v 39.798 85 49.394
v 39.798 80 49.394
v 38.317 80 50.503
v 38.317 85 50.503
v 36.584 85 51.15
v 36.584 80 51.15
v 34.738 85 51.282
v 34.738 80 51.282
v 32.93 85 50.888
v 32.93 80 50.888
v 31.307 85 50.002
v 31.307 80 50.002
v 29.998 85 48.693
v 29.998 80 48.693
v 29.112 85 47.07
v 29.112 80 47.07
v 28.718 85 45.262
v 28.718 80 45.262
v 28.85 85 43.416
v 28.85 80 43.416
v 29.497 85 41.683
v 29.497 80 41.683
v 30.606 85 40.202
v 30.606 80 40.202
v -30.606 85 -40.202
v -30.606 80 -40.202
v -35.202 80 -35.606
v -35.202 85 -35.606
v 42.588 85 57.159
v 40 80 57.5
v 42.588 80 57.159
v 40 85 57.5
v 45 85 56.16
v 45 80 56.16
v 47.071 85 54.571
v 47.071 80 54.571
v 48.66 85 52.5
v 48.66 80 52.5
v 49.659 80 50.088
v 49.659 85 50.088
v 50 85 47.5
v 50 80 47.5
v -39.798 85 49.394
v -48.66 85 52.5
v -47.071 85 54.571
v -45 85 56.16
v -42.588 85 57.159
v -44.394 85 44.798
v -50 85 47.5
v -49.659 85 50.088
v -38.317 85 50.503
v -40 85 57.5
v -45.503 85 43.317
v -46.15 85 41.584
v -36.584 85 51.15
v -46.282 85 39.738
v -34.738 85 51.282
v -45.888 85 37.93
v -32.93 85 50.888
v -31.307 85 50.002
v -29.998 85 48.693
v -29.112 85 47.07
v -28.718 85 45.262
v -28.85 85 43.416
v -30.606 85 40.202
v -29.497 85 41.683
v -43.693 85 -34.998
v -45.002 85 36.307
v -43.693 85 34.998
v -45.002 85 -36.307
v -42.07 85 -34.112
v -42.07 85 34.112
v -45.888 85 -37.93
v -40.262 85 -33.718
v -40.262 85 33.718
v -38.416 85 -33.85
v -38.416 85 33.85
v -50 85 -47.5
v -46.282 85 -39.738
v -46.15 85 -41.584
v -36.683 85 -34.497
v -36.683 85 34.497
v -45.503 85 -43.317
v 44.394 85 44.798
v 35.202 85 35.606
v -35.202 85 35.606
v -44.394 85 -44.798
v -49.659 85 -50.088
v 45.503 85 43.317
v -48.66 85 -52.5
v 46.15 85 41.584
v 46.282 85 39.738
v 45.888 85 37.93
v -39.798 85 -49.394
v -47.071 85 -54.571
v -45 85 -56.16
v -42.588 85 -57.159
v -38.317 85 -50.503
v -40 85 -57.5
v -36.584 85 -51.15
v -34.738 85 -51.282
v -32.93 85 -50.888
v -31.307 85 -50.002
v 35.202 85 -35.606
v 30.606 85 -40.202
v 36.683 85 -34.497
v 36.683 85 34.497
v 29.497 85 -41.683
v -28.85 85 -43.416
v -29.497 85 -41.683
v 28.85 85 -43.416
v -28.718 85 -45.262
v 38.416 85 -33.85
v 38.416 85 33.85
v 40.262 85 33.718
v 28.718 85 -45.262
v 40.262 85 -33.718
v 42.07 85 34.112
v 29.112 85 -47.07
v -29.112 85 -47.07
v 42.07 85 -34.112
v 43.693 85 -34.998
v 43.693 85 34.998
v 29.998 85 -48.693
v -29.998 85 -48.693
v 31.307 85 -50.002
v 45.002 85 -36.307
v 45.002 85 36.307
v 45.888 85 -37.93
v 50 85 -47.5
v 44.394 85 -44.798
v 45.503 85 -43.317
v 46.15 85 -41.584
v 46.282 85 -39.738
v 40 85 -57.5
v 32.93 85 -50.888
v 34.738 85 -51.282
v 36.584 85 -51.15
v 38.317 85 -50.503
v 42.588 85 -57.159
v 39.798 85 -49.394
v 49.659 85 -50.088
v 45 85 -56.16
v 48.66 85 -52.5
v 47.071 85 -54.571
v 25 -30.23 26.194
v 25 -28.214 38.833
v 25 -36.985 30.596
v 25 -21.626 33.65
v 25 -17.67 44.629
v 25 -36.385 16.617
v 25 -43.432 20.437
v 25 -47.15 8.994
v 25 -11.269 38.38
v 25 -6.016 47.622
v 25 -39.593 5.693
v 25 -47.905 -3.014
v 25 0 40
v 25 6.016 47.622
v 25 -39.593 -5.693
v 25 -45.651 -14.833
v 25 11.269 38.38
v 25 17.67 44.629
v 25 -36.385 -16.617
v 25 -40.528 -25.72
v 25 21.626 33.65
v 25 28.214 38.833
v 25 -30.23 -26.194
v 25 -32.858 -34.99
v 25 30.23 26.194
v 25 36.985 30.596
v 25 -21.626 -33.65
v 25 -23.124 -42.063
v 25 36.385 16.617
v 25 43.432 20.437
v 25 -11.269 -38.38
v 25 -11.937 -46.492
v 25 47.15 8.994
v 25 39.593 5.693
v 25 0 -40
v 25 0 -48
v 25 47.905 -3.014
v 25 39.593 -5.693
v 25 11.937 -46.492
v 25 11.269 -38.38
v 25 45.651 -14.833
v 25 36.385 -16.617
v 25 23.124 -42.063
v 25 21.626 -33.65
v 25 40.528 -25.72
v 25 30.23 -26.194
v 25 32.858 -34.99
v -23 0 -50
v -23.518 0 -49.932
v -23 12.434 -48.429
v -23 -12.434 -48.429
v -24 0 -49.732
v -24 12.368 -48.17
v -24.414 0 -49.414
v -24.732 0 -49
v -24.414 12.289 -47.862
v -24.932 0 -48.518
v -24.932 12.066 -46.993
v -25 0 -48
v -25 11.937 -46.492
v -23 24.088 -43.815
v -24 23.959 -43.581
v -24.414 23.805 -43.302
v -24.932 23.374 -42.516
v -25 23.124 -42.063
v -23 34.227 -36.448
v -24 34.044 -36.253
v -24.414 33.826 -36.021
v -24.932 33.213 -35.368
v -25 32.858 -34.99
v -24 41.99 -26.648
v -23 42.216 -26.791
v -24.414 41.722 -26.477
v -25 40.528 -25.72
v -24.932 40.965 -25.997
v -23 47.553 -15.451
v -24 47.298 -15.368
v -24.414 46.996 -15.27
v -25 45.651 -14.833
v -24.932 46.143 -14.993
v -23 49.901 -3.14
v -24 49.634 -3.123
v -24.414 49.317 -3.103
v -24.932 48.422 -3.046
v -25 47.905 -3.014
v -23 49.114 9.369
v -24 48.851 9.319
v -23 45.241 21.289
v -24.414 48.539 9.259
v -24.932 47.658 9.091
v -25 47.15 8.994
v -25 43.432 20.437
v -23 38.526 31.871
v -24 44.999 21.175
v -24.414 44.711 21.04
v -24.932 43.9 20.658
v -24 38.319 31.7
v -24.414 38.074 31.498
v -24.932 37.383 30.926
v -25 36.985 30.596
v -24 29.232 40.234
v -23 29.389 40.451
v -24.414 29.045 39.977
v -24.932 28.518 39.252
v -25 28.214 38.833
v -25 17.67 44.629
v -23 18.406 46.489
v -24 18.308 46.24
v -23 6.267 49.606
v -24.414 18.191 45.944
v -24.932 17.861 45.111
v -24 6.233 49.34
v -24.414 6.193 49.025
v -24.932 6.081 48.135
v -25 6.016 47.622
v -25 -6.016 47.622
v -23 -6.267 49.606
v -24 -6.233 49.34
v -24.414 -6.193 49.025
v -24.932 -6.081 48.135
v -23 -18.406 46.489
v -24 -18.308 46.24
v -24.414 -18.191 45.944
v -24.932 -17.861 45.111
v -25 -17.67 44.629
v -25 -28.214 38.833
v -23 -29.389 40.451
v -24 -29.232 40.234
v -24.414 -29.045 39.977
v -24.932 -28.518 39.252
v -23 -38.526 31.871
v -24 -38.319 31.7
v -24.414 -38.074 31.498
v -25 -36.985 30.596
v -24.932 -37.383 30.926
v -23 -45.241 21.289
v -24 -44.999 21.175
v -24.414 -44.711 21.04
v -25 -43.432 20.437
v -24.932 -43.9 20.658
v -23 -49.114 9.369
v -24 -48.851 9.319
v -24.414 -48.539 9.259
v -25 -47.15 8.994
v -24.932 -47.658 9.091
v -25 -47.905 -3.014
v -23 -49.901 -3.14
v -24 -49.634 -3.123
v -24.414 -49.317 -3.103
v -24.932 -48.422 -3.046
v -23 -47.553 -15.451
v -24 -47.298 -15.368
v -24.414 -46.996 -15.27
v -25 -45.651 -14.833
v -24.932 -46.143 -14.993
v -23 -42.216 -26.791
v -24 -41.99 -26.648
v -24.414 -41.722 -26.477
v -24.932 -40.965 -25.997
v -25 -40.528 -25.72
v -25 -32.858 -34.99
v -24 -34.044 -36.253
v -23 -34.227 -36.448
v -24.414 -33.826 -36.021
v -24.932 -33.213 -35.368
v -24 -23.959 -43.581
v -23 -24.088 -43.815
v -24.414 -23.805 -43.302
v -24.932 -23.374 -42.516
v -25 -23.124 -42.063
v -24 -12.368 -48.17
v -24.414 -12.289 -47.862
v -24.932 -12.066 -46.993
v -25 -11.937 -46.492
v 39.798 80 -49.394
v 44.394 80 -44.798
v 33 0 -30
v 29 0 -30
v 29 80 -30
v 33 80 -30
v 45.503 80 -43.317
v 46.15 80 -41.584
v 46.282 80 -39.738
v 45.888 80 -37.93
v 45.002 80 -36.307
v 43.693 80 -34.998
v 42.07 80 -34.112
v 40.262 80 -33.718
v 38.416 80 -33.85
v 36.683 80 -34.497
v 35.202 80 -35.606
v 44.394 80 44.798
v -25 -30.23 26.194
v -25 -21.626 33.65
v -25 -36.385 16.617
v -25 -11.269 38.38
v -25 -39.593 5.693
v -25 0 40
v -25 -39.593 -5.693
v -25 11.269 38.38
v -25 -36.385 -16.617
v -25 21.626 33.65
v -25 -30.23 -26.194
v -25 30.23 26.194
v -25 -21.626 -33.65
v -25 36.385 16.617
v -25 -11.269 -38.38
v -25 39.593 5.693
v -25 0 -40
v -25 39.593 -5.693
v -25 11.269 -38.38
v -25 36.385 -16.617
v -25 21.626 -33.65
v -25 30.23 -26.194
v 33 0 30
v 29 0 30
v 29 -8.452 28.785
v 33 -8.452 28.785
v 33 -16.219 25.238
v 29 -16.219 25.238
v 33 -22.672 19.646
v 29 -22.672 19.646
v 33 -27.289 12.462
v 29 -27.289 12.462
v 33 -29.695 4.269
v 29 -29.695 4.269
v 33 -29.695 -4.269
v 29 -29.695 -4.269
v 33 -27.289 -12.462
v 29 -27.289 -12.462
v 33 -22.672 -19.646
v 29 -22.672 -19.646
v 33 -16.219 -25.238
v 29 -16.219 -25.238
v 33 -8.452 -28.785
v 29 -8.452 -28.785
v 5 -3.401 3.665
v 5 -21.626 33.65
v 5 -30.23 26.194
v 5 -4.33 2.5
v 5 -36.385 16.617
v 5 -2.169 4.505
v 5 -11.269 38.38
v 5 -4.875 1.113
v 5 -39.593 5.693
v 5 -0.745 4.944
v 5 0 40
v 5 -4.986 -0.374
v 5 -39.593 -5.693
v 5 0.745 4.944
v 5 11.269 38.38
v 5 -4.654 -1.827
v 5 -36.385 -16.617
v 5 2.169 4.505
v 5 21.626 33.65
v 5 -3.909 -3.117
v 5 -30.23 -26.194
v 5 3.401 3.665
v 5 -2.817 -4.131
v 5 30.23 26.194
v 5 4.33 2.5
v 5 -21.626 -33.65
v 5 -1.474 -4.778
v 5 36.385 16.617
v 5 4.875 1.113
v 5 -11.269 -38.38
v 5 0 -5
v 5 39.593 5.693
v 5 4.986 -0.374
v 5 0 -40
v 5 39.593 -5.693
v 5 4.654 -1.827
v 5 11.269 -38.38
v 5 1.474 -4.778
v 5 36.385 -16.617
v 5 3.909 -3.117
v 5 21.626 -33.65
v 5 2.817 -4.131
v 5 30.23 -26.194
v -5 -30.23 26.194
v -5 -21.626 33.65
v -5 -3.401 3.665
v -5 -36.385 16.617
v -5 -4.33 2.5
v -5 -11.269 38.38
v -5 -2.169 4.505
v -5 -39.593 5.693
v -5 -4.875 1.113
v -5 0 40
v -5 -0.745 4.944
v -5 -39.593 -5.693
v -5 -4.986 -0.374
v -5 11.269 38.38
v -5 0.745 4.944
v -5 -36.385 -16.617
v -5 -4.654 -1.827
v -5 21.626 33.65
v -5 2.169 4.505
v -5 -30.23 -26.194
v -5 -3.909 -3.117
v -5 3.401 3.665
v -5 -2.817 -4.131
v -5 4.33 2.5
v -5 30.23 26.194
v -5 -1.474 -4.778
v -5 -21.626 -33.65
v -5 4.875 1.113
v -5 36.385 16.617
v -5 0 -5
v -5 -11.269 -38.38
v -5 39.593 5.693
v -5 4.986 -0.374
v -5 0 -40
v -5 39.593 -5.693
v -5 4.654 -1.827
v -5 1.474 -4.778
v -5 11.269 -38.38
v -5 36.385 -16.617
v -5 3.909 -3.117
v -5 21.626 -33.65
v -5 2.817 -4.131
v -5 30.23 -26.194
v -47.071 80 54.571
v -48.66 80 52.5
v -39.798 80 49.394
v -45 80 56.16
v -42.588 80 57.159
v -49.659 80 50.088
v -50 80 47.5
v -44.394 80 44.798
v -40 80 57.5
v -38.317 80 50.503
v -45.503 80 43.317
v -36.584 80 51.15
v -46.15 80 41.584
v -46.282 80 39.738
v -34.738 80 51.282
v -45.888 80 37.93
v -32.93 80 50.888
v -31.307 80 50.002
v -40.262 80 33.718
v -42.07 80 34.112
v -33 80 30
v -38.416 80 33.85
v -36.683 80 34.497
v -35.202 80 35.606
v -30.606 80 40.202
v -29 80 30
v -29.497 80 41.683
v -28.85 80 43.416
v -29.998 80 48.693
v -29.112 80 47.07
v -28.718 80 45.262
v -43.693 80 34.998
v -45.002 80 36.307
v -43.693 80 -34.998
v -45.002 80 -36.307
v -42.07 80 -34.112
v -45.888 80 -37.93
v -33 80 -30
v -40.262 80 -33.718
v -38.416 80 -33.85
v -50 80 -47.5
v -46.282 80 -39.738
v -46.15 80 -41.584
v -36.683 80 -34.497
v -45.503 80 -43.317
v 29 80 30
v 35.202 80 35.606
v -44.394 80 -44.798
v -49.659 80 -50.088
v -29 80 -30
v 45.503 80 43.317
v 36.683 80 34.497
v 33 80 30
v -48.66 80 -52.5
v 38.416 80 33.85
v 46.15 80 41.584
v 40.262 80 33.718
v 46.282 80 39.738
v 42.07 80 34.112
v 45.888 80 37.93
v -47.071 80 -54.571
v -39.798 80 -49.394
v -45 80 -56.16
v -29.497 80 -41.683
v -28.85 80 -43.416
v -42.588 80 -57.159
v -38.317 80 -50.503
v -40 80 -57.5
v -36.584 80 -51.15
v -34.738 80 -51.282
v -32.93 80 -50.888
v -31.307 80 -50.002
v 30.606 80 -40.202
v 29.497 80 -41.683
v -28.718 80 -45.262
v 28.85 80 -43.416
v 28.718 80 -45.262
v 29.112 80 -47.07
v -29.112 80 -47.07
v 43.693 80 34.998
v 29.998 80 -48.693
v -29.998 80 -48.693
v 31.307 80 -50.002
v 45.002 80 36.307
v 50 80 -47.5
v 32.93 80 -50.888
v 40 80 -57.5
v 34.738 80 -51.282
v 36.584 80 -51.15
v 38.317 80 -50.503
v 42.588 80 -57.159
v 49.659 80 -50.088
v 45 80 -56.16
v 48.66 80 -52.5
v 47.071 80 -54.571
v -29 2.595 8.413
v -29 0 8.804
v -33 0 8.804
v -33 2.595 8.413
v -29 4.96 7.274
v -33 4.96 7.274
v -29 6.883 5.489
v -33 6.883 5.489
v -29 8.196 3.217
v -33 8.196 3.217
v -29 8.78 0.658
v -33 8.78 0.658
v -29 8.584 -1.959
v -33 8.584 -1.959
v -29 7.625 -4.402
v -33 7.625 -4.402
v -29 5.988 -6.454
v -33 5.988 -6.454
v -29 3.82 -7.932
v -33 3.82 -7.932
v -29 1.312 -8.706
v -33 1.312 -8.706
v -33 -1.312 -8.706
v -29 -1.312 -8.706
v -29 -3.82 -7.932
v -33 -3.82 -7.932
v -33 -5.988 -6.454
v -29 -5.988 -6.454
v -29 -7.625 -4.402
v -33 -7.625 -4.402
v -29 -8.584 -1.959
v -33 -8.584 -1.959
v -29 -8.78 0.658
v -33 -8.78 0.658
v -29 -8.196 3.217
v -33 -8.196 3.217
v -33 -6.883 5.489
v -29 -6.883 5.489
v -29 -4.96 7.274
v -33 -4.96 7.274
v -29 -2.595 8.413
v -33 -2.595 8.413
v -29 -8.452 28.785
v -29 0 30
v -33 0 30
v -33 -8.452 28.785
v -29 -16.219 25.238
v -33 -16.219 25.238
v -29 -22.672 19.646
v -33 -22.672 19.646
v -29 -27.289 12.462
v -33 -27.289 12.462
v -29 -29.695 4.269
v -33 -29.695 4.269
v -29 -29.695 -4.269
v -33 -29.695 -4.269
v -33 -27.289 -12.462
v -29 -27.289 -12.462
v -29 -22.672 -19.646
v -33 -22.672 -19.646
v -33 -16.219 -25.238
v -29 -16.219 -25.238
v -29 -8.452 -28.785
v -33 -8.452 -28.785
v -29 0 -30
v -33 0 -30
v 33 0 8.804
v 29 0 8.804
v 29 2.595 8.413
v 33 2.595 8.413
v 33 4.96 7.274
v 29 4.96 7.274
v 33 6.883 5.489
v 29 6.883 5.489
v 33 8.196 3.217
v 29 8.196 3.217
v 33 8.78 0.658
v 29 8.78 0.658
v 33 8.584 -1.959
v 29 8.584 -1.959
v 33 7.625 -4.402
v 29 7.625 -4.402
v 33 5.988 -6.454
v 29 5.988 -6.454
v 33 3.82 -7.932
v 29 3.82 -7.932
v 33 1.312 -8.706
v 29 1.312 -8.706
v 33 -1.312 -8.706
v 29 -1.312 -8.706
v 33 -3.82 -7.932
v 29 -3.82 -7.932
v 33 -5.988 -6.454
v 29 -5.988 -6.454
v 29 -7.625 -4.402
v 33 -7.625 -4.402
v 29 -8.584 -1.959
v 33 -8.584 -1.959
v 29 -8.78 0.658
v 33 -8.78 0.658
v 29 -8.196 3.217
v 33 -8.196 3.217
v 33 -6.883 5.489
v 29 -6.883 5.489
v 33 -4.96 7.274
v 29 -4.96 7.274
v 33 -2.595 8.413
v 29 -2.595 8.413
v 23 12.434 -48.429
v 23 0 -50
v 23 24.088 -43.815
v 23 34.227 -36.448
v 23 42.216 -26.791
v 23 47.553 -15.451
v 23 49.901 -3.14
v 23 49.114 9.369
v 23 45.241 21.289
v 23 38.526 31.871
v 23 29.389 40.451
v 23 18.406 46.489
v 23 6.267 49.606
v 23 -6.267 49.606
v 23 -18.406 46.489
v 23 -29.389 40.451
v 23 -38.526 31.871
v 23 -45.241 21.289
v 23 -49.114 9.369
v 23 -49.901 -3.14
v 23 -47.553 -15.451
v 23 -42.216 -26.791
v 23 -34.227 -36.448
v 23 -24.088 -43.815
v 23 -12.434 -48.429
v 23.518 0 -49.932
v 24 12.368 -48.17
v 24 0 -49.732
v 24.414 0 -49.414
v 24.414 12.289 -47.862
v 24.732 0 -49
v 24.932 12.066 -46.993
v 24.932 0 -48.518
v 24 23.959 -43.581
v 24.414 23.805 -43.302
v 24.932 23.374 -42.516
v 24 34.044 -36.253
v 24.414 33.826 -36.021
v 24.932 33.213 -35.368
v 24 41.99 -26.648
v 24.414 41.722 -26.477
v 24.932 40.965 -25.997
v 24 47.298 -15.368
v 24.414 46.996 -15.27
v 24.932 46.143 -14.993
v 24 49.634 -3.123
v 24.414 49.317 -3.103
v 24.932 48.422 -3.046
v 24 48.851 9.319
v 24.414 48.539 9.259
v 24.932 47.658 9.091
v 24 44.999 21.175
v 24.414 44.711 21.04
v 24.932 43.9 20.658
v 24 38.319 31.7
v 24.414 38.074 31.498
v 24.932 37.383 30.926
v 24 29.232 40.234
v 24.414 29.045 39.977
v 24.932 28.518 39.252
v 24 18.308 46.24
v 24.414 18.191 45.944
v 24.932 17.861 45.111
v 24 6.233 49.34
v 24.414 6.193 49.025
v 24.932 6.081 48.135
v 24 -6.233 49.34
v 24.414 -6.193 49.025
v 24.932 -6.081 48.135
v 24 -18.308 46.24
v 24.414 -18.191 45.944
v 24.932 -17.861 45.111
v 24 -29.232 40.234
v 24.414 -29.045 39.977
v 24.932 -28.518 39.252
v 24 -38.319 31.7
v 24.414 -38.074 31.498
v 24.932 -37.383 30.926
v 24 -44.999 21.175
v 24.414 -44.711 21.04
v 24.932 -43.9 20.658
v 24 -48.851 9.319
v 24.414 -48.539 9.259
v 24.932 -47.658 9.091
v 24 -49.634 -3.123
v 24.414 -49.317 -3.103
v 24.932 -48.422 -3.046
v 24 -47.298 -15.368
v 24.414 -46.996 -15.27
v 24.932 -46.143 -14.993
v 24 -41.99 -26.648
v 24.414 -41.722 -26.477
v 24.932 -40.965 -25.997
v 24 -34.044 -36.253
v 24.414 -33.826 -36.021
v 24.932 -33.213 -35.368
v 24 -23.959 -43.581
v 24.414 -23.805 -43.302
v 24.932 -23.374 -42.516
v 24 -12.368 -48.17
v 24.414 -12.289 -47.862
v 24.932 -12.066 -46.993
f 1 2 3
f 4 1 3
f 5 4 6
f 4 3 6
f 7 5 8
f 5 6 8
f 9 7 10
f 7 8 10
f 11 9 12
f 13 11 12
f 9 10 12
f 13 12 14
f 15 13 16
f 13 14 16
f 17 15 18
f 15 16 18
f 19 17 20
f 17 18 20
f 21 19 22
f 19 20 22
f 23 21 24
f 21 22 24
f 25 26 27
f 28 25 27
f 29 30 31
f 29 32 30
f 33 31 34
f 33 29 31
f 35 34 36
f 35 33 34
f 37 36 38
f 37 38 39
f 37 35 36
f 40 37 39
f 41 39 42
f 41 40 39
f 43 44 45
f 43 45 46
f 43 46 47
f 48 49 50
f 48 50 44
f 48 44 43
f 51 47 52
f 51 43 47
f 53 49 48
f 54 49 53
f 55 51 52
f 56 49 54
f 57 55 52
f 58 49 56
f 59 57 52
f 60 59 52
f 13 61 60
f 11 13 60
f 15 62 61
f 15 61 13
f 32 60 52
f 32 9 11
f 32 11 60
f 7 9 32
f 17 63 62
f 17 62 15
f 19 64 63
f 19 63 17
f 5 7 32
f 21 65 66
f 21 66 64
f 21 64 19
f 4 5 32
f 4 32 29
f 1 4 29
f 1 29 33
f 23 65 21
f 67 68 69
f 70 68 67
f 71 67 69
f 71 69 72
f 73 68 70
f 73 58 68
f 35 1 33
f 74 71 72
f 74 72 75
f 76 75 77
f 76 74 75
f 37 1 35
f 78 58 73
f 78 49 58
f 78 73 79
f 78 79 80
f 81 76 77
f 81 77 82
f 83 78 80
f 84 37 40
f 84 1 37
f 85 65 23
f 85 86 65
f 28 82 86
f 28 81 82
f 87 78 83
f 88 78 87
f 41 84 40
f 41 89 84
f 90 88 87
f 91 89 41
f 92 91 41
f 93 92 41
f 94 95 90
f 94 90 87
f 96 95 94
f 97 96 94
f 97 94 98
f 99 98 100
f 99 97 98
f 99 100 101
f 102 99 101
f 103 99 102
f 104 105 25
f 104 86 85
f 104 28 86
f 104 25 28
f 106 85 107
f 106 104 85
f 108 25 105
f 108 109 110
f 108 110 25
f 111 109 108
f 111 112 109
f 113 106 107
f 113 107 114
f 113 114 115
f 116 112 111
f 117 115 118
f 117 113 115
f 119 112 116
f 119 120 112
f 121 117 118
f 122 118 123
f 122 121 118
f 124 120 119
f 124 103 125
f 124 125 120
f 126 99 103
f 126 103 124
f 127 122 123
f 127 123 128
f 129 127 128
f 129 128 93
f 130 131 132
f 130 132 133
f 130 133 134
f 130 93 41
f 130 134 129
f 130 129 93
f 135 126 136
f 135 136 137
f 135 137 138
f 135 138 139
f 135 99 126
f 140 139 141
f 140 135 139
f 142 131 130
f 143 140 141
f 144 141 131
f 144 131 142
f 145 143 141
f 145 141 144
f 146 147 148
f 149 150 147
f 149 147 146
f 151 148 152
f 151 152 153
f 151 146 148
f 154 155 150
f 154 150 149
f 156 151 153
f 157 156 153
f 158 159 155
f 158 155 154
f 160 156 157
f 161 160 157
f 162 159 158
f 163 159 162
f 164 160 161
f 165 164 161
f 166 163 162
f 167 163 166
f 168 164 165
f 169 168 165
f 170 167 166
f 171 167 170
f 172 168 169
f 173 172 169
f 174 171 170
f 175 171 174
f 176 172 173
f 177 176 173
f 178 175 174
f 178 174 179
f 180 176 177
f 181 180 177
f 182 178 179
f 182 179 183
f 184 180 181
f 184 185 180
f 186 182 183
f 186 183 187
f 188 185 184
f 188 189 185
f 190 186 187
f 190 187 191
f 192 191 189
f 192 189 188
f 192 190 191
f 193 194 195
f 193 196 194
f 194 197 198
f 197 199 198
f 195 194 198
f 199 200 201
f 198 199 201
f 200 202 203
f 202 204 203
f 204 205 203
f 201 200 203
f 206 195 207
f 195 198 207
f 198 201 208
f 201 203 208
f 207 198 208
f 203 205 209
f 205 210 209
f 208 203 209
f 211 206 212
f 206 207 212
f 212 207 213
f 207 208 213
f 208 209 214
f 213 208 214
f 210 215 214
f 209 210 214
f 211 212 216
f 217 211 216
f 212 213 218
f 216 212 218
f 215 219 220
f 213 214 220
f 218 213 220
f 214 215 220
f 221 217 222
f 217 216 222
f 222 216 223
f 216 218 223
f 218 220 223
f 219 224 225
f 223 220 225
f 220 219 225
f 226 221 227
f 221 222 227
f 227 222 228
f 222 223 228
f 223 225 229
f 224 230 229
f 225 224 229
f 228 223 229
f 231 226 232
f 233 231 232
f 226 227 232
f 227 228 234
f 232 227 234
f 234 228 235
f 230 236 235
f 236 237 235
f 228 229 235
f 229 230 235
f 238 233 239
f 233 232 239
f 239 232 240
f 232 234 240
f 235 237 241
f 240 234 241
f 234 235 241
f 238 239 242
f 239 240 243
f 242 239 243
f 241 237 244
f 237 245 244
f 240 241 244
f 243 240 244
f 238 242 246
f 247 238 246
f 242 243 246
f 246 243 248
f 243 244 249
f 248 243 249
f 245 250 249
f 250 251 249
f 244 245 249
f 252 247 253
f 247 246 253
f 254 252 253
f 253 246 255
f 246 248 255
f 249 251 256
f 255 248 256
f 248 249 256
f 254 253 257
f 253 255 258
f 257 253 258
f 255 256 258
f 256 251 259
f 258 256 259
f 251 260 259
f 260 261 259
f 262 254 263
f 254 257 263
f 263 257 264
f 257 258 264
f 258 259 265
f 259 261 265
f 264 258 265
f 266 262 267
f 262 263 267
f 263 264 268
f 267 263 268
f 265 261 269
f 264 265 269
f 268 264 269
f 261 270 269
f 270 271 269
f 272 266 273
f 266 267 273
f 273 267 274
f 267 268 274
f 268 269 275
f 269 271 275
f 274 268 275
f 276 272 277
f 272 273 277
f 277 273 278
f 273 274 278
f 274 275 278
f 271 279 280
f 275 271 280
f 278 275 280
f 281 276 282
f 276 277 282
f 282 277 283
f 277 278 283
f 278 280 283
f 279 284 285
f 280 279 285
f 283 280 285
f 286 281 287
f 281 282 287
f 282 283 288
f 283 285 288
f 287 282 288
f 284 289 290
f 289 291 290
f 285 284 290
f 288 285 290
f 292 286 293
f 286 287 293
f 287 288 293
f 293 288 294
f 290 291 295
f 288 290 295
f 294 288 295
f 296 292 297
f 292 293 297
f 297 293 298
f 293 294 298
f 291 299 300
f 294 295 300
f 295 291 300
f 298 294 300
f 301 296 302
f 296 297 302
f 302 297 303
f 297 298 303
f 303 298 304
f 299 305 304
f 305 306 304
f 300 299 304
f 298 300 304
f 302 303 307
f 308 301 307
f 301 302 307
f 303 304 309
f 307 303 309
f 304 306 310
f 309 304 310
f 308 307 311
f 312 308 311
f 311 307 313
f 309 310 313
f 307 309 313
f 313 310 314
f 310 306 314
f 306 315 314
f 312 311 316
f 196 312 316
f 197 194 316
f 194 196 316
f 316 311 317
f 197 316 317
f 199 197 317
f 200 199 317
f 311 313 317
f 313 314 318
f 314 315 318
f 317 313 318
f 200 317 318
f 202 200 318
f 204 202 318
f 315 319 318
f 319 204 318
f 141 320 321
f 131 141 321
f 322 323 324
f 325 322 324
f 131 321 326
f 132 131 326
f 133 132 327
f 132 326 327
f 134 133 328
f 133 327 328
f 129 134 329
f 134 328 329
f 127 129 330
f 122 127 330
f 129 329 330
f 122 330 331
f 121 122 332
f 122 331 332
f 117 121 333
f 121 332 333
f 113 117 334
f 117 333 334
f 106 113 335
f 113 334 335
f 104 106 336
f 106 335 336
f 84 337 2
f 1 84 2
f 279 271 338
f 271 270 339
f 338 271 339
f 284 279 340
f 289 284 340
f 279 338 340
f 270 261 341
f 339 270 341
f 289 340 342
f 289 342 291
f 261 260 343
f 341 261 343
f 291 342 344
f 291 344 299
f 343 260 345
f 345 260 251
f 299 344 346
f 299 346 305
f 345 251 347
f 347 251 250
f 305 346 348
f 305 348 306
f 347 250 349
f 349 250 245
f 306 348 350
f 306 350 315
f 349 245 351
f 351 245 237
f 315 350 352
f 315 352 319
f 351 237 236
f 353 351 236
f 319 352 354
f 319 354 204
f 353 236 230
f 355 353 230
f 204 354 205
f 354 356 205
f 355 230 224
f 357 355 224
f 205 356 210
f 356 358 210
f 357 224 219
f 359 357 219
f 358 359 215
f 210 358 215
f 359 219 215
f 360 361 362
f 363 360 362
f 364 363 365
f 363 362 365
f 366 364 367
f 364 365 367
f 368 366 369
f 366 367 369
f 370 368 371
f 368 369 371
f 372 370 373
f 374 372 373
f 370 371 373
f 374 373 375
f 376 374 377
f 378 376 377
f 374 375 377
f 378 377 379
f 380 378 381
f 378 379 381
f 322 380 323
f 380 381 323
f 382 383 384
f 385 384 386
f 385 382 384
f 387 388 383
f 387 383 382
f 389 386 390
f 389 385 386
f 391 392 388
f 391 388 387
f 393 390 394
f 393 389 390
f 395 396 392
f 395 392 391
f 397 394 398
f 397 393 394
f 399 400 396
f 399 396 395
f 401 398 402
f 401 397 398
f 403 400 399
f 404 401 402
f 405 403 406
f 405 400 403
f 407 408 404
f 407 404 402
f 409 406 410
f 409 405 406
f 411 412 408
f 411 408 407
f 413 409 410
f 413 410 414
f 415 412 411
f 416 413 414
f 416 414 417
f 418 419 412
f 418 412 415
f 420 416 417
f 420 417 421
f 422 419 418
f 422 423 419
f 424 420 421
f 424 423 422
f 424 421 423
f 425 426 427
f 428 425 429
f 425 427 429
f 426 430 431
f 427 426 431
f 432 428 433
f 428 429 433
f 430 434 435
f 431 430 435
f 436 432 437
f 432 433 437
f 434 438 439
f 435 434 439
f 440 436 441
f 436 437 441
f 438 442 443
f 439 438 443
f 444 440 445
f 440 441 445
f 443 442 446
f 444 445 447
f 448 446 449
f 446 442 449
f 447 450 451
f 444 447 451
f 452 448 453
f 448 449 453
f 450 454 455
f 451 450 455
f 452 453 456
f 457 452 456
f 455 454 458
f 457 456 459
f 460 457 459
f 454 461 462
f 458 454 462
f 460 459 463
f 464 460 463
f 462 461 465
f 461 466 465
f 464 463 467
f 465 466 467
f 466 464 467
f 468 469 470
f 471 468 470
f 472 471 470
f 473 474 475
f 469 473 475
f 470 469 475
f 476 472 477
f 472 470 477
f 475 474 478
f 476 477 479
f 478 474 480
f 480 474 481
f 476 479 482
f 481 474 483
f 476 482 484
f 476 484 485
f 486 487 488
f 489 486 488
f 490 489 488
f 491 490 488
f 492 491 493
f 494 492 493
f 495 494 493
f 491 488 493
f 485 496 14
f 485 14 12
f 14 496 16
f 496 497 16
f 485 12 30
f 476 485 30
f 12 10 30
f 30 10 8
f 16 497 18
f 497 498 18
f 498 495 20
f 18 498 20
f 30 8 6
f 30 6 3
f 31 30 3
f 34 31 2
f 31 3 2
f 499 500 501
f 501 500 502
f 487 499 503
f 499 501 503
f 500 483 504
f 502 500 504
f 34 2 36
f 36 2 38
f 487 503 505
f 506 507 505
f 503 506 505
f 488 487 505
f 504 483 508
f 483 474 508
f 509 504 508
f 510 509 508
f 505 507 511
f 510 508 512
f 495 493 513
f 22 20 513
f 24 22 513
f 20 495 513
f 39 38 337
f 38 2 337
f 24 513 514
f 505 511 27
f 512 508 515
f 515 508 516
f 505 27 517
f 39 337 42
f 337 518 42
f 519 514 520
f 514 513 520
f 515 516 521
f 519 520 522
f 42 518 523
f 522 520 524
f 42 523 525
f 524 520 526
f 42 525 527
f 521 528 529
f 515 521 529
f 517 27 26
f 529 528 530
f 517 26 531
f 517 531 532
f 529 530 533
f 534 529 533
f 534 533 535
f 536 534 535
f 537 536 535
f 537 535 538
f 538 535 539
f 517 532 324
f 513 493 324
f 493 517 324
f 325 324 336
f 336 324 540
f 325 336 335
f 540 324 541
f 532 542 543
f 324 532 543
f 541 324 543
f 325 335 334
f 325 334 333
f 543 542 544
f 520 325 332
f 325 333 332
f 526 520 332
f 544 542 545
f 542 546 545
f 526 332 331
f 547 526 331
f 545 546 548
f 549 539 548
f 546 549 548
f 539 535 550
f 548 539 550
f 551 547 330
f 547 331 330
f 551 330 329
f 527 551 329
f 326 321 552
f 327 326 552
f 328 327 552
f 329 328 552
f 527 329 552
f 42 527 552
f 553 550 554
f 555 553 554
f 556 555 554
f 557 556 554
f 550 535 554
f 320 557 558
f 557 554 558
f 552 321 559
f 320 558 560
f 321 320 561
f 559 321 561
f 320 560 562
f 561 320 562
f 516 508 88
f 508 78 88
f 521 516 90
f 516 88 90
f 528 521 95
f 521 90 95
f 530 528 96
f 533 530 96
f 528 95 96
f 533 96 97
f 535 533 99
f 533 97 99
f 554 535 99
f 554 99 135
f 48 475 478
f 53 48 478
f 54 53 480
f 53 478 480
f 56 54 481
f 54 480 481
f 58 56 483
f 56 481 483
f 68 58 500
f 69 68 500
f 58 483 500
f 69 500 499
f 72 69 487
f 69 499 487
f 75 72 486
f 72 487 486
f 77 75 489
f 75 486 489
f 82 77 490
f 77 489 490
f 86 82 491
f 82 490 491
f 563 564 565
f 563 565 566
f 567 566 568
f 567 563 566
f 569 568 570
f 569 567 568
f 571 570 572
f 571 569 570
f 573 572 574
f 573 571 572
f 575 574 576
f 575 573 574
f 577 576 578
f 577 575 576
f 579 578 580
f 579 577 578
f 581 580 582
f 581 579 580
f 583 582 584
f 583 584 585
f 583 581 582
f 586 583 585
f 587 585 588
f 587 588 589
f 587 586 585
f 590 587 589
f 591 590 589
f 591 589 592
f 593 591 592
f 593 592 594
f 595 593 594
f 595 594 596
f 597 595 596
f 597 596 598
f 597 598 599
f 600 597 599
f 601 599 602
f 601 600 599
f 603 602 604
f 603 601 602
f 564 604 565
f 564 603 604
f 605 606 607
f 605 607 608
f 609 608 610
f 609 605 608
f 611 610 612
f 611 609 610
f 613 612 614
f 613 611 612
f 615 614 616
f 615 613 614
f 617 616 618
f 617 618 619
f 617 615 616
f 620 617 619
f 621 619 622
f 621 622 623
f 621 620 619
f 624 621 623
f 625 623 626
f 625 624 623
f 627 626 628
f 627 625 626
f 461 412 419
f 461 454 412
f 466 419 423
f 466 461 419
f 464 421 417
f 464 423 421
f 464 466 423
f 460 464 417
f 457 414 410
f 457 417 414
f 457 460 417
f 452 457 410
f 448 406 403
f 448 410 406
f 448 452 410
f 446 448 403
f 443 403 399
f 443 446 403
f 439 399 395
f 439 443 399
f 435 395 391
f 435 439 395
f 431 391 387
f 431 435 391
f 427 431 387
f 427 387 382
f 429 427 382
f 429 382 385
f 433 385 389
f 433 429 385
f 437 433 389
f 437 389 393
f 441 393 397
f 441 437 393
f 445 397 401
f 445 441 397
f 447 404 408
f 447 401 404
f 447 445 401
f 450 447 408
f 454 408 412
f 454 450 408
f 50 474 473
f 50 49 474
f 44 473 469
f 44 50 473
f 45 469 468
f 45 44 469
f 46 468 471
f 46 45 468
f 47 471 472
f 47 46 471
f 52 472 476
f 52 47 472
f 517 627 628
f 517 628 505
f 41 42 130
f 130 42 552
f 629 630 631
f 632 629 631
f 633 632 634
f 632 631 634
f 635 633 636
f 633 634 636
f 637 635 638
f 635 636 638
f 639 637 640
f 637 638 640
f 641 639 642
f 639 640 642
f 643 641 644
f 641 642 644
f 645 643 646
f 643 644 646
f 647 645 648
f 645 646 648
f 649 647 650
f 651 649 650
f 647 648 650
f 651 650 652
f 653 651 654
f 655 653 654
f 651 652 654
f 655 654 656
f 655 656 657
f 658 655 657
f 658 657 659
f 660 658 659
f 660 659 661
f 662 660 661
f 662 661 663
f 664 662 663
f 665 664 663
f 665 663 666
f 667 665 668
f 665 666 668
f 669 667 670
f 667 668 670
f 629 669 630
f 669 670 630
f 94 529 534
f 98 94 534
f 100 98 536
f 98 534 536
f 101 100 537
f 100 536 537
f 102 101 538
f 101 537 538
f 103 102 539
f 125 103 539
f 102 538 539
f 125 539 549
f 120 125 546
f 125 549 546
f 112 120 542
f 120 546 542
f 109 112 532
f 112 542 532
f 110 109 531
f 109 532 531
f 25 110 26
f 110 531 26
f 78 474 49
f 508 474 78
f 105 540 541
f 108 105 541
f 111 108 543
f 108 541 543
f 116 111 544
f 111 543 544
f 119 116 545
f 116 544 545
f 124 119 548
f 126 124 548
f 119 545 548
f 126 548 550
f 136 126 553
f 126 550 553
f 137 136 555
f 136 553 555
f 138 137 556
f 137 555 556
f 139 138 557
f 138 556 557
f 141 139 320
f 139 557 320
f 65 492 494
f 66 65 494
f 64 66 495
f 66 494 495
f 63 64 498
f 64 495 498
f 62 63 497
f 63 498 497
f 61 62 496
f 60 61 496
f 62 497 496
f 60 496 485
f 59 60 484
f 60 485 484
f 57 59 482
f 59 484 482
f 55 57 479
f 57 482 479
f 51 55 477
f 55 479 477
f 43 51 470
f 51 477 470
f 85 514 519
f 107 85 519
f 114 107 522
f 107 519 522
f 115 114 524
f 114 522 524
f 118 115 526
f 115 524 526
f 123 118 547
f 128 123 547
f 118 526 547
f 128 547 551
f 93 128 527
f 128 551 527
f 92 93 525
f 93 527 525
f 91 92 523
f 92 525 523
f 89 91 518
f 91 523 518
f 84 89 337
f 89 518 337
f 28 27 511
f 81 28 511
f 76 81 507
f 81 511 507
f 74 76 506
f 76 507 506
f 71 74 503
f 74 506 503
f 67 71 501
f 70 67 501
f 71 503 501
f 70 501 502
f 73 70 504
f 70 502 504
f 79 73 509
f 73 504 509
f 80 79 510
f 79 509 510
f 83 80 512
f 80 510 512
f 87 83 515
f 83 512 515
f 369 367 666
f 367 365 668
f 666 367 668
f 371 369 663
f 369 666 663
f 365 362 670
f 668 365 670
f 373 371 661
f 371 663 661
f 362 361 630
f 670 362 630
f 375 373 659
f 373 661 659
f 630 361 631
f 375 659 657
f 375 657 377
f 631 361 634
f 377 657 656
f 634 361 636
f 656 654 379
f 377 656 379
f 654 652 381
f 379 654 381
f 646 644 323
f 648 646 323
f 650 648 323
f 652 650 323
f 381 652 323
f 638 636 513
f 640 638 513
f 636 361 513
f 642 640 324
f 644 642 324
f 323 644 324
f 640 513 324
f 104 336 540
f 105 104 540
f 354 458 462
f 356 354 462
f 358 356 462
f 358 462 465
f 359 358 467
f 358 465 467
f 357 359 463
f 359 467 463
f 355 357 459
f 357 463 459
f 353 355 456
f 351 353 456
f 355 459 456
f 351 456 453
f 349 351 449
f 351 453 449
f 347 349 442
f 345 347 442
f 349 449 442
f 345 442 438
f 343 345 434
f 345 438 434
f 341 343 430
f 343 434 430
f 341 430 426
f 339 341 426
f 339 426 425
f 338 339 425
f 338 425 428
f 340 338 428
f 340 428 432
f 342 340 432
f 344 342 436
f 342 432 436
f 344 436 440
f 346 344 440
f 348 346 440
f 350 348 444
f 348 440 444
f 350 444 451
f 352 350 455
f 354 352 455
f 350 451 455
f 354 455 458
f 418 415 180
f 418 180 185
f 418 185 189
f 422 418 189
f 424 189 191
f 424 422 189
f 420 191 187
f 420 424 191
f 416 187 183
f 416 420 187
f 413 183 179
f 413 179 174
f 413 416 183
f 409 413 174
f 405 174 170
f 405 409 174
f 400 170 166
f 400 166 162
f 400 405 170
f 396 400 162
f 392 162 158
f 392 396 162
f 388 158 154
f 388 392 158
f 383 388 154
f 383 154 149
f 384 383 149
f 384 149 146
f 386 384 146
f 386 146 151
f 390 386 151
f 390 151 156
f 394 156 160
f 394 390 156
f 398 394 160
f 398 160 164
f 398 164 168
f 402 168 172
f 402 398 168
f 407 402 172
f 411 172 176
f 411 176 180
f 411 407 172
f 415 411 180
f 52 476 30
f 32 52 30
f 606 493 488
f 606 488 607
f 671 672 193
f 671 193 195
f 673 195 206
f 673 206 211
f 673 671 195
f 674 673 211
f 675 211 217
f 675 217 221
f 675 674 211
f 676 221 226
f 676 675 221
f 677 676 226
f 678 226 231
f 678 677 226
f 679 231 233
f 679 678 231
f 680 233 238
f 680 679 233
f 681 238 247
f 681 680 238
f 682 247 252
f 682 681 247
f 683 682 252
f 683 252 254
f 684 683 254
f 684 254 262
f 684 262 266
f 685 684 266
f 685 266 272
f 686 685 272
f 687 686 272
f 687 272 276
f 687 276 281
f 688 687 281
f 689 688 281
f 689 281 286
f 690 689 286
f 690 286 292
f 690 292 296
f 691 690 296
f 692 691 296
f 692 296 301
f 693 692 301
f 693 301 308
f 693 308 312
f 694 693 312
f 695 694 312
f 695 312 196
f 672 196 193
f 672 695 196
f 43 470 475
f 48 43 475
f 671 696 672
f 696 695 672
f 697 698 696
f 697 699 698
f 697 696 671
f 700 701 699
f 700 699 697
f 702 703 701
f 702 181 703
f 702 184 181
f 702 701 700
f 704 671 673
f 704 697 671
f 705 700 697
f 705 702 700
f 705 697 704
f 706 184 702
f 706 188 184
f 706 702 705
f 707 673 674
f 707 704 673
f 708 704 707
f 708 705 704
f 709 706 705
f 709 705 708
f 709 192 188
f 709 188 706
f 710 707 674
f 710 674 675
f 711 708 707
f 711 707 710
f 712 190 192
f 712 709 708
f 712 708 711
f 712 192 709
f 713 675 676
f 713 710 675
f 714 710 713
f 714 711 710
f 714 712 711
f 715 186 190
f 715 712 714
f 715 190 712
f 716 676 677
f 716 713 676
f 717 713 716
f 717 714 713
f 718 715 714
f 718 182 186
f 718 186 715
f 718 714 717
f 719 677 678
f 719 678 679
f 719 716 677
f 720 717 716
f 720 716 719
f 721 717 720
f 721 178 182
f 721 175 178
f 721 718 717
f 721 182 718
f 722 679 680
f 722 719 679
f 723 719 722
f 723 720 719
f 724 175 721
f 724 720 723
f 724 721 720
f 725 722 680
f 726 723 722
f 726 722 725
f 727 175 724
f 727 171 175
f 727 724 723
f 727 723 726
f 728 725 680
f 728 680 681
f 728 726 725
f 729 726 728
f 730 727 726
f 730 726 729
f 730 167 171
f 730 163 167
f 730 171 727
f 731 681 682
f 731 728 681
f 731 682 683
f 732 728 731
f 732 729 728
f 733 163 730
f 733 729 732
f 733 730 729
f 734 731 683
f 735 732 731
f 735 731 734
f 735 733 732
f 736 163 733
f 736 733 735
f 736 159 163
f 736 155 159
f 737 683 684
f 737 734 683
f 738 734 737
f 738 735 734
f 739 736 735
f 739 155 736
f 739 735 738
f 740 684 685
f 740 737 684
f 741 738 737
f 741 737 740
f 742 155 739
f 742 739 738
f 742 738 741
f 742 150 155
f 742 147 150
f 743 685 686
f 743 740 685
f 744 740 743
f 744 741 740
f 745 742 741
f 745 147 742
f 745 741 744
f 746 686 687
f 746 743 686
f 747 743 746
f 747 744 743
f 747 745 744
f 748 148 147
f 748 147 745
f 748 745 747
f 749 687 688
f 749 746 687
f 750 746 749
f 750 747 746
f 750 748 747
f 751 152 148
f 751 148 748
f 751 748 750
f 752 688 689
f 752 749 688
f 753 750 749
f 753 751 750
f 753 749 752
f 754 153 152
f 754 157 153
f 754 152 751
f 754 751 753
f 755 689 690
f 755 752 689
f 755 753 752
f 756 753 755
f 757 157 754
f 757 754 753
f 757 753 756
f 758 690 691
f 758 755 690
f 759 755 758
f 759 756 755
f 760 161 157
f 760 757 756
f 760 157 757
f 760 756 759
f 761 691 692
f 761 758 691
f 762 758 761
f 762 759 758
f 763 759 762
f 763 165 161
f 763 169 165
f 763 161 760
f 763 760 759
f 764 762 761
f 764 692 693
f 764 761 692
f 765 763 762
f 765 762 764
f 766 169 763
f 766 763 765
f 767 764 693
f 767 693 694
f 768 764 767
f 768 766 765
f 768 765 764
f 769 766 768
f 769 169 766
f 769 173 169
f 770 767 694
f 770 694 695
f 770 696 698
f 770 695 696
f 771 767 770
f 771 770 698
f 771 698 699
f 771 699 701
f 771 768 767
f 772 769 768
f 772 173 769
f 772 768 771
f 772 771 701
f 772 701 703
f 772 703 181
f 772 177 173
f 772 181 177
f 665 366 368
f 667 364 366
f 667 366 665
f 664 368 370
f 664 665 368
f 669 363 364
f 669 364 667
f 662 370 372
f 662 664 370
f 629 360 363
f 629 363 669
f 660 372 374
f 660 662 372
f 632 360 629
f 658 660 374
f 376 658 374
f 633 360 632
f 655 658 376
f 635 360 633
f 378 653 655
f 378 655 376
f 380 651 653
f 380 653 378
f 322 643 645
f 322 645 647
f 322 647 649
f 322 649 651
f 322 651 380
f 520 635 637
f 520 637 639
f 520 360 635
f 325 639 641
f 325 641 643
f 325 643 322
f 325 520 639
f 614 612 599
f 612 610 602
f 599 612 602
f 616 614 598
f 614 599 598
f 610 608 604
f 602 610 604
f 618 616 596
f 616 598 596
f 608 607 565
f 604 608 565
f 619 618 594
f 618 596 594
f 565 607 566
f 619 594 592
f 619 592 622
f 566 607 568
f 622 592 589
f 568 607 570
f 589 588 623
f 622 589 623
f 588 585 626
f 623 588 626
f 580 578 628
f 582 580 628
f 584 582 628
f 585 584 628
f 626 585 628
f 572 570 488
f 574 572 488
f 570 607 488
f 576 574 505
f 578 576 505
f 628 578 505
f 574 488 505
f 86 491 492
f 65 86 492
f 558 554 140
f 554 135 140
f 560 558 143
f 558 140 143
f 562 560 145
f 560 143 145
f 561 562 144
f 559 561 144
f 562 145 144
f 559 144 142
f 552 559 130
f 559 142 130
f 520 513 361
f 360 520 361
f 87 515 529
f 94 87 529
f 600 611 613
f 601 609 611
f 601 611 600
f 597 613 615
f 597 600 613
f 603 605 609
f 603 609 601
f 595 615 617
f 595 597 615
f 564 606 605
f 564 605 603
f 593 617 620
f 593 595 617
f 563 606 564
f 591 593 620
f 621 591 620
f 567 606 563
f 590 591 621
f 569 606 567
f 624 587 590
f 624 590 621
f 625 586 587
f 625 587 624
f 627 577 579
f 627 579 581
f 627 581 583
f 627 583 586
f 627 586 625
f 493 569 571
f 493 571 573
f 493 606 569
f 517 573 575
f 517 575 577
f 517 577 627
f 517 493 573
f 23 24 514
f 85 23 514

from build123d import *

# Parameters (mm, degrees)
SKETCH1_R           = 50
SKETCH1_R_2         = 5
BOSS_EXTRUDE1_DEPTH = 25
CUT_EXTRUDE1_START  = -5
SKETCH3_R           = 40
CUT_EXTRUDE1_DEPTH  = 20
CUT_EXTRUDE2_START  = 25
SKETCH3_2_R         = 40
CUT_EXTRUDE2_DEPTH  = 20
SKETCH4_R           = 8.804244638
BOSS_EXTRUDE2_DEPTH = 4
SKETCH5_W           = 100
SKETCH5_H           = 115
BOSS_EXTRUDE3_DEPTH = 5
FILLET1_R           = 10
FILLET2_R           = 2


with BuildPart() as part:
    # Sketch1 → Boss-Extrude1 (new, symmetric)
    with BuildSketch(Plane(origin=(0, 0, 0), x_dir=(0, 0, -1), z_dir=(1, 0, 0))):
        Circle(SKETCH1_R)
        Circle(SKETCH1_R_2, mode=Mode.SUBTRACT)
    extrude(amount=BOSS_EXTRUDE1_DEPTH, both=True)

    # Sketch3 → Cut-Extrude1 (cut)
    with BuildSketch(Plane(origin=(0, 0, 0), x_dir=(0, 0, -1), z_dir=(1, 0, 0)).offset(CUT_EXTRUDE1_START)):
        Circle(SKETCH3_R)
    extrude(amount=-CUT_EXTRUDE1_DEPTH, mode=Mode.SUBTRACT)

    # Sketch3<2> → Cut-Extrude2 (cut)
    with BuildSketch(Plane(origin=(0, 0, 0), x_dir=(0, 0, -1), z_dir=(1, 0, 0)).offset(CUT_EXTRUDE2_START)):
        Circle(SKETCH3_2_R)
    extrude(amount=-CUT_EXTRUDE2_DEPTH, mode=Mode.SUBTRACT)

    # Fillet2
    fillet2_edges = [part.edges().sort_by_distance(p)[0] for p in [
        (-25, 0, 50),
        (25, 0, 50),
    ]]
    fillet(fillet2_edges, radius=FILLET2_R)


with BuildPart() as body_2:
    # Sketch4 → Boss-Extrude2 (new body)
    with BuildSketch(Plane.ZY.offset(29)):
        with BuildLine():
            Line((-30, 0), (-30, 80))
            Line((-30, 80), (30, 80))
            Line((30, 80), (30, 0))
            ThreePointArc((30, 0), (0, -30), (-30, 0))
        make_face()
        Circle(SKETCH4_R, mode=Mode.SUBTRACT)
    extrude(amount=BOSS_EXTRUDE2_DEPTH)


with BuildPart() as body_3:
    # Mirror4: mirrored copy
    add(body_2.part.mirror(Plane(origin=(0, 0, 0), x_dir=(0, 0, 1), z_dir=(1, 0, 0))))


with BuildPart() as body_2_1:
    add(body_2.part)

    add(body_3.part)  # Boss-Extrude3 merges body 3
    # Sketch5 → Boss-Extrude3 (add)
    with BuildSketch(Plane(origin=(0, 80, 0), x_dir=(1, 0, 0), z_dir=(0, 1, 0))):
        Rectangle(SKETCH5_W, SKETCH5_H)
        with BuildLine():
            Line((39.798097039, 49.394291117), (44.394291117, 44.798097039))
            ThreePointArc((44.394291117, 44.798097039), (44.394291117, 35.605708883), (35.201902961, 35.605708883))
            Line((35.201902961, 35.605708883), (30.605708883, 40.201902961))
            ThreePointArc((30.605708883, 40.201902961), (30.605708883, 49.394291117), (39.798097039, 49.394291117))
        make_face(mode=Mode.SUBTRACT)
        with BuildLine():
            Line((-44.394291117, 44.798097039), (-39.798097039, 49.394291117))
            ThreePointArc((-39.798097039, 49.394291117), (-30.605708883, 49.394291117), (-30.605708883, 40.201902961))
            Line((-30.605708883, 40.201902961), (-35.201902961, 35.605708883))
            ThreePointArc((-35.201902961, 35.605708883), (-44.394291117, 35.605708883), (-44.394291117, 44.798097039))
        make_face(mode=Mode.SUBTRACT)
        with BuildLine():
            Line((-35.201902961, -35.605708883), (-30.605708883, -40.201902961))
            ThreePointArc((-30.605708883, -40.201902961), (-30.605708883, -49.394291117), (-39.798097039, -49.394291117))
            Line((-39.798097039, -49.394291117), (-44.394291117, -44.798097039))
            ThreePointArc((-44.394291117, -44.798097039), (-44.394291117, -35.605708883), (-35.201902961, -35.605708883))
        make_face(mode=Mode.SUBTRACT)
        with BuildLine():
            Line((44.394291117, -44.798097039), (39.798097039, -49.394291117))
            ThreePointArc((39.798097039, -49.394291117), (30.605708883, -49.394291117), (30.605708883, -40.201902961))
            Line((30.605708883, -40.201902961), (35.201902961, -35.605708883))
            ThreePointArc((35.201902961, -35.605708883), (44.394291117, -35.605708883), (44.394291117, -44.798097039))
        make_face(mode=Mode.SUBTRACT)
    extrude(amount=BOSS_EXTRUDE3_DEPTH)

    # Fillet1
    fillet1_edges = [body_2_1.edges().sort_by_distance(p)[0] for p in [
        (50, 82.5, -57.5),
        (-50, 82.5, -57.5),
        (50, 82.5, 57.5),
        (-50, 82.5, 57.5),
    ]]
    fillet(fillet1_edges, radius=FILLET1_R)


solid = Compound([part.part, body_2_1.part])
